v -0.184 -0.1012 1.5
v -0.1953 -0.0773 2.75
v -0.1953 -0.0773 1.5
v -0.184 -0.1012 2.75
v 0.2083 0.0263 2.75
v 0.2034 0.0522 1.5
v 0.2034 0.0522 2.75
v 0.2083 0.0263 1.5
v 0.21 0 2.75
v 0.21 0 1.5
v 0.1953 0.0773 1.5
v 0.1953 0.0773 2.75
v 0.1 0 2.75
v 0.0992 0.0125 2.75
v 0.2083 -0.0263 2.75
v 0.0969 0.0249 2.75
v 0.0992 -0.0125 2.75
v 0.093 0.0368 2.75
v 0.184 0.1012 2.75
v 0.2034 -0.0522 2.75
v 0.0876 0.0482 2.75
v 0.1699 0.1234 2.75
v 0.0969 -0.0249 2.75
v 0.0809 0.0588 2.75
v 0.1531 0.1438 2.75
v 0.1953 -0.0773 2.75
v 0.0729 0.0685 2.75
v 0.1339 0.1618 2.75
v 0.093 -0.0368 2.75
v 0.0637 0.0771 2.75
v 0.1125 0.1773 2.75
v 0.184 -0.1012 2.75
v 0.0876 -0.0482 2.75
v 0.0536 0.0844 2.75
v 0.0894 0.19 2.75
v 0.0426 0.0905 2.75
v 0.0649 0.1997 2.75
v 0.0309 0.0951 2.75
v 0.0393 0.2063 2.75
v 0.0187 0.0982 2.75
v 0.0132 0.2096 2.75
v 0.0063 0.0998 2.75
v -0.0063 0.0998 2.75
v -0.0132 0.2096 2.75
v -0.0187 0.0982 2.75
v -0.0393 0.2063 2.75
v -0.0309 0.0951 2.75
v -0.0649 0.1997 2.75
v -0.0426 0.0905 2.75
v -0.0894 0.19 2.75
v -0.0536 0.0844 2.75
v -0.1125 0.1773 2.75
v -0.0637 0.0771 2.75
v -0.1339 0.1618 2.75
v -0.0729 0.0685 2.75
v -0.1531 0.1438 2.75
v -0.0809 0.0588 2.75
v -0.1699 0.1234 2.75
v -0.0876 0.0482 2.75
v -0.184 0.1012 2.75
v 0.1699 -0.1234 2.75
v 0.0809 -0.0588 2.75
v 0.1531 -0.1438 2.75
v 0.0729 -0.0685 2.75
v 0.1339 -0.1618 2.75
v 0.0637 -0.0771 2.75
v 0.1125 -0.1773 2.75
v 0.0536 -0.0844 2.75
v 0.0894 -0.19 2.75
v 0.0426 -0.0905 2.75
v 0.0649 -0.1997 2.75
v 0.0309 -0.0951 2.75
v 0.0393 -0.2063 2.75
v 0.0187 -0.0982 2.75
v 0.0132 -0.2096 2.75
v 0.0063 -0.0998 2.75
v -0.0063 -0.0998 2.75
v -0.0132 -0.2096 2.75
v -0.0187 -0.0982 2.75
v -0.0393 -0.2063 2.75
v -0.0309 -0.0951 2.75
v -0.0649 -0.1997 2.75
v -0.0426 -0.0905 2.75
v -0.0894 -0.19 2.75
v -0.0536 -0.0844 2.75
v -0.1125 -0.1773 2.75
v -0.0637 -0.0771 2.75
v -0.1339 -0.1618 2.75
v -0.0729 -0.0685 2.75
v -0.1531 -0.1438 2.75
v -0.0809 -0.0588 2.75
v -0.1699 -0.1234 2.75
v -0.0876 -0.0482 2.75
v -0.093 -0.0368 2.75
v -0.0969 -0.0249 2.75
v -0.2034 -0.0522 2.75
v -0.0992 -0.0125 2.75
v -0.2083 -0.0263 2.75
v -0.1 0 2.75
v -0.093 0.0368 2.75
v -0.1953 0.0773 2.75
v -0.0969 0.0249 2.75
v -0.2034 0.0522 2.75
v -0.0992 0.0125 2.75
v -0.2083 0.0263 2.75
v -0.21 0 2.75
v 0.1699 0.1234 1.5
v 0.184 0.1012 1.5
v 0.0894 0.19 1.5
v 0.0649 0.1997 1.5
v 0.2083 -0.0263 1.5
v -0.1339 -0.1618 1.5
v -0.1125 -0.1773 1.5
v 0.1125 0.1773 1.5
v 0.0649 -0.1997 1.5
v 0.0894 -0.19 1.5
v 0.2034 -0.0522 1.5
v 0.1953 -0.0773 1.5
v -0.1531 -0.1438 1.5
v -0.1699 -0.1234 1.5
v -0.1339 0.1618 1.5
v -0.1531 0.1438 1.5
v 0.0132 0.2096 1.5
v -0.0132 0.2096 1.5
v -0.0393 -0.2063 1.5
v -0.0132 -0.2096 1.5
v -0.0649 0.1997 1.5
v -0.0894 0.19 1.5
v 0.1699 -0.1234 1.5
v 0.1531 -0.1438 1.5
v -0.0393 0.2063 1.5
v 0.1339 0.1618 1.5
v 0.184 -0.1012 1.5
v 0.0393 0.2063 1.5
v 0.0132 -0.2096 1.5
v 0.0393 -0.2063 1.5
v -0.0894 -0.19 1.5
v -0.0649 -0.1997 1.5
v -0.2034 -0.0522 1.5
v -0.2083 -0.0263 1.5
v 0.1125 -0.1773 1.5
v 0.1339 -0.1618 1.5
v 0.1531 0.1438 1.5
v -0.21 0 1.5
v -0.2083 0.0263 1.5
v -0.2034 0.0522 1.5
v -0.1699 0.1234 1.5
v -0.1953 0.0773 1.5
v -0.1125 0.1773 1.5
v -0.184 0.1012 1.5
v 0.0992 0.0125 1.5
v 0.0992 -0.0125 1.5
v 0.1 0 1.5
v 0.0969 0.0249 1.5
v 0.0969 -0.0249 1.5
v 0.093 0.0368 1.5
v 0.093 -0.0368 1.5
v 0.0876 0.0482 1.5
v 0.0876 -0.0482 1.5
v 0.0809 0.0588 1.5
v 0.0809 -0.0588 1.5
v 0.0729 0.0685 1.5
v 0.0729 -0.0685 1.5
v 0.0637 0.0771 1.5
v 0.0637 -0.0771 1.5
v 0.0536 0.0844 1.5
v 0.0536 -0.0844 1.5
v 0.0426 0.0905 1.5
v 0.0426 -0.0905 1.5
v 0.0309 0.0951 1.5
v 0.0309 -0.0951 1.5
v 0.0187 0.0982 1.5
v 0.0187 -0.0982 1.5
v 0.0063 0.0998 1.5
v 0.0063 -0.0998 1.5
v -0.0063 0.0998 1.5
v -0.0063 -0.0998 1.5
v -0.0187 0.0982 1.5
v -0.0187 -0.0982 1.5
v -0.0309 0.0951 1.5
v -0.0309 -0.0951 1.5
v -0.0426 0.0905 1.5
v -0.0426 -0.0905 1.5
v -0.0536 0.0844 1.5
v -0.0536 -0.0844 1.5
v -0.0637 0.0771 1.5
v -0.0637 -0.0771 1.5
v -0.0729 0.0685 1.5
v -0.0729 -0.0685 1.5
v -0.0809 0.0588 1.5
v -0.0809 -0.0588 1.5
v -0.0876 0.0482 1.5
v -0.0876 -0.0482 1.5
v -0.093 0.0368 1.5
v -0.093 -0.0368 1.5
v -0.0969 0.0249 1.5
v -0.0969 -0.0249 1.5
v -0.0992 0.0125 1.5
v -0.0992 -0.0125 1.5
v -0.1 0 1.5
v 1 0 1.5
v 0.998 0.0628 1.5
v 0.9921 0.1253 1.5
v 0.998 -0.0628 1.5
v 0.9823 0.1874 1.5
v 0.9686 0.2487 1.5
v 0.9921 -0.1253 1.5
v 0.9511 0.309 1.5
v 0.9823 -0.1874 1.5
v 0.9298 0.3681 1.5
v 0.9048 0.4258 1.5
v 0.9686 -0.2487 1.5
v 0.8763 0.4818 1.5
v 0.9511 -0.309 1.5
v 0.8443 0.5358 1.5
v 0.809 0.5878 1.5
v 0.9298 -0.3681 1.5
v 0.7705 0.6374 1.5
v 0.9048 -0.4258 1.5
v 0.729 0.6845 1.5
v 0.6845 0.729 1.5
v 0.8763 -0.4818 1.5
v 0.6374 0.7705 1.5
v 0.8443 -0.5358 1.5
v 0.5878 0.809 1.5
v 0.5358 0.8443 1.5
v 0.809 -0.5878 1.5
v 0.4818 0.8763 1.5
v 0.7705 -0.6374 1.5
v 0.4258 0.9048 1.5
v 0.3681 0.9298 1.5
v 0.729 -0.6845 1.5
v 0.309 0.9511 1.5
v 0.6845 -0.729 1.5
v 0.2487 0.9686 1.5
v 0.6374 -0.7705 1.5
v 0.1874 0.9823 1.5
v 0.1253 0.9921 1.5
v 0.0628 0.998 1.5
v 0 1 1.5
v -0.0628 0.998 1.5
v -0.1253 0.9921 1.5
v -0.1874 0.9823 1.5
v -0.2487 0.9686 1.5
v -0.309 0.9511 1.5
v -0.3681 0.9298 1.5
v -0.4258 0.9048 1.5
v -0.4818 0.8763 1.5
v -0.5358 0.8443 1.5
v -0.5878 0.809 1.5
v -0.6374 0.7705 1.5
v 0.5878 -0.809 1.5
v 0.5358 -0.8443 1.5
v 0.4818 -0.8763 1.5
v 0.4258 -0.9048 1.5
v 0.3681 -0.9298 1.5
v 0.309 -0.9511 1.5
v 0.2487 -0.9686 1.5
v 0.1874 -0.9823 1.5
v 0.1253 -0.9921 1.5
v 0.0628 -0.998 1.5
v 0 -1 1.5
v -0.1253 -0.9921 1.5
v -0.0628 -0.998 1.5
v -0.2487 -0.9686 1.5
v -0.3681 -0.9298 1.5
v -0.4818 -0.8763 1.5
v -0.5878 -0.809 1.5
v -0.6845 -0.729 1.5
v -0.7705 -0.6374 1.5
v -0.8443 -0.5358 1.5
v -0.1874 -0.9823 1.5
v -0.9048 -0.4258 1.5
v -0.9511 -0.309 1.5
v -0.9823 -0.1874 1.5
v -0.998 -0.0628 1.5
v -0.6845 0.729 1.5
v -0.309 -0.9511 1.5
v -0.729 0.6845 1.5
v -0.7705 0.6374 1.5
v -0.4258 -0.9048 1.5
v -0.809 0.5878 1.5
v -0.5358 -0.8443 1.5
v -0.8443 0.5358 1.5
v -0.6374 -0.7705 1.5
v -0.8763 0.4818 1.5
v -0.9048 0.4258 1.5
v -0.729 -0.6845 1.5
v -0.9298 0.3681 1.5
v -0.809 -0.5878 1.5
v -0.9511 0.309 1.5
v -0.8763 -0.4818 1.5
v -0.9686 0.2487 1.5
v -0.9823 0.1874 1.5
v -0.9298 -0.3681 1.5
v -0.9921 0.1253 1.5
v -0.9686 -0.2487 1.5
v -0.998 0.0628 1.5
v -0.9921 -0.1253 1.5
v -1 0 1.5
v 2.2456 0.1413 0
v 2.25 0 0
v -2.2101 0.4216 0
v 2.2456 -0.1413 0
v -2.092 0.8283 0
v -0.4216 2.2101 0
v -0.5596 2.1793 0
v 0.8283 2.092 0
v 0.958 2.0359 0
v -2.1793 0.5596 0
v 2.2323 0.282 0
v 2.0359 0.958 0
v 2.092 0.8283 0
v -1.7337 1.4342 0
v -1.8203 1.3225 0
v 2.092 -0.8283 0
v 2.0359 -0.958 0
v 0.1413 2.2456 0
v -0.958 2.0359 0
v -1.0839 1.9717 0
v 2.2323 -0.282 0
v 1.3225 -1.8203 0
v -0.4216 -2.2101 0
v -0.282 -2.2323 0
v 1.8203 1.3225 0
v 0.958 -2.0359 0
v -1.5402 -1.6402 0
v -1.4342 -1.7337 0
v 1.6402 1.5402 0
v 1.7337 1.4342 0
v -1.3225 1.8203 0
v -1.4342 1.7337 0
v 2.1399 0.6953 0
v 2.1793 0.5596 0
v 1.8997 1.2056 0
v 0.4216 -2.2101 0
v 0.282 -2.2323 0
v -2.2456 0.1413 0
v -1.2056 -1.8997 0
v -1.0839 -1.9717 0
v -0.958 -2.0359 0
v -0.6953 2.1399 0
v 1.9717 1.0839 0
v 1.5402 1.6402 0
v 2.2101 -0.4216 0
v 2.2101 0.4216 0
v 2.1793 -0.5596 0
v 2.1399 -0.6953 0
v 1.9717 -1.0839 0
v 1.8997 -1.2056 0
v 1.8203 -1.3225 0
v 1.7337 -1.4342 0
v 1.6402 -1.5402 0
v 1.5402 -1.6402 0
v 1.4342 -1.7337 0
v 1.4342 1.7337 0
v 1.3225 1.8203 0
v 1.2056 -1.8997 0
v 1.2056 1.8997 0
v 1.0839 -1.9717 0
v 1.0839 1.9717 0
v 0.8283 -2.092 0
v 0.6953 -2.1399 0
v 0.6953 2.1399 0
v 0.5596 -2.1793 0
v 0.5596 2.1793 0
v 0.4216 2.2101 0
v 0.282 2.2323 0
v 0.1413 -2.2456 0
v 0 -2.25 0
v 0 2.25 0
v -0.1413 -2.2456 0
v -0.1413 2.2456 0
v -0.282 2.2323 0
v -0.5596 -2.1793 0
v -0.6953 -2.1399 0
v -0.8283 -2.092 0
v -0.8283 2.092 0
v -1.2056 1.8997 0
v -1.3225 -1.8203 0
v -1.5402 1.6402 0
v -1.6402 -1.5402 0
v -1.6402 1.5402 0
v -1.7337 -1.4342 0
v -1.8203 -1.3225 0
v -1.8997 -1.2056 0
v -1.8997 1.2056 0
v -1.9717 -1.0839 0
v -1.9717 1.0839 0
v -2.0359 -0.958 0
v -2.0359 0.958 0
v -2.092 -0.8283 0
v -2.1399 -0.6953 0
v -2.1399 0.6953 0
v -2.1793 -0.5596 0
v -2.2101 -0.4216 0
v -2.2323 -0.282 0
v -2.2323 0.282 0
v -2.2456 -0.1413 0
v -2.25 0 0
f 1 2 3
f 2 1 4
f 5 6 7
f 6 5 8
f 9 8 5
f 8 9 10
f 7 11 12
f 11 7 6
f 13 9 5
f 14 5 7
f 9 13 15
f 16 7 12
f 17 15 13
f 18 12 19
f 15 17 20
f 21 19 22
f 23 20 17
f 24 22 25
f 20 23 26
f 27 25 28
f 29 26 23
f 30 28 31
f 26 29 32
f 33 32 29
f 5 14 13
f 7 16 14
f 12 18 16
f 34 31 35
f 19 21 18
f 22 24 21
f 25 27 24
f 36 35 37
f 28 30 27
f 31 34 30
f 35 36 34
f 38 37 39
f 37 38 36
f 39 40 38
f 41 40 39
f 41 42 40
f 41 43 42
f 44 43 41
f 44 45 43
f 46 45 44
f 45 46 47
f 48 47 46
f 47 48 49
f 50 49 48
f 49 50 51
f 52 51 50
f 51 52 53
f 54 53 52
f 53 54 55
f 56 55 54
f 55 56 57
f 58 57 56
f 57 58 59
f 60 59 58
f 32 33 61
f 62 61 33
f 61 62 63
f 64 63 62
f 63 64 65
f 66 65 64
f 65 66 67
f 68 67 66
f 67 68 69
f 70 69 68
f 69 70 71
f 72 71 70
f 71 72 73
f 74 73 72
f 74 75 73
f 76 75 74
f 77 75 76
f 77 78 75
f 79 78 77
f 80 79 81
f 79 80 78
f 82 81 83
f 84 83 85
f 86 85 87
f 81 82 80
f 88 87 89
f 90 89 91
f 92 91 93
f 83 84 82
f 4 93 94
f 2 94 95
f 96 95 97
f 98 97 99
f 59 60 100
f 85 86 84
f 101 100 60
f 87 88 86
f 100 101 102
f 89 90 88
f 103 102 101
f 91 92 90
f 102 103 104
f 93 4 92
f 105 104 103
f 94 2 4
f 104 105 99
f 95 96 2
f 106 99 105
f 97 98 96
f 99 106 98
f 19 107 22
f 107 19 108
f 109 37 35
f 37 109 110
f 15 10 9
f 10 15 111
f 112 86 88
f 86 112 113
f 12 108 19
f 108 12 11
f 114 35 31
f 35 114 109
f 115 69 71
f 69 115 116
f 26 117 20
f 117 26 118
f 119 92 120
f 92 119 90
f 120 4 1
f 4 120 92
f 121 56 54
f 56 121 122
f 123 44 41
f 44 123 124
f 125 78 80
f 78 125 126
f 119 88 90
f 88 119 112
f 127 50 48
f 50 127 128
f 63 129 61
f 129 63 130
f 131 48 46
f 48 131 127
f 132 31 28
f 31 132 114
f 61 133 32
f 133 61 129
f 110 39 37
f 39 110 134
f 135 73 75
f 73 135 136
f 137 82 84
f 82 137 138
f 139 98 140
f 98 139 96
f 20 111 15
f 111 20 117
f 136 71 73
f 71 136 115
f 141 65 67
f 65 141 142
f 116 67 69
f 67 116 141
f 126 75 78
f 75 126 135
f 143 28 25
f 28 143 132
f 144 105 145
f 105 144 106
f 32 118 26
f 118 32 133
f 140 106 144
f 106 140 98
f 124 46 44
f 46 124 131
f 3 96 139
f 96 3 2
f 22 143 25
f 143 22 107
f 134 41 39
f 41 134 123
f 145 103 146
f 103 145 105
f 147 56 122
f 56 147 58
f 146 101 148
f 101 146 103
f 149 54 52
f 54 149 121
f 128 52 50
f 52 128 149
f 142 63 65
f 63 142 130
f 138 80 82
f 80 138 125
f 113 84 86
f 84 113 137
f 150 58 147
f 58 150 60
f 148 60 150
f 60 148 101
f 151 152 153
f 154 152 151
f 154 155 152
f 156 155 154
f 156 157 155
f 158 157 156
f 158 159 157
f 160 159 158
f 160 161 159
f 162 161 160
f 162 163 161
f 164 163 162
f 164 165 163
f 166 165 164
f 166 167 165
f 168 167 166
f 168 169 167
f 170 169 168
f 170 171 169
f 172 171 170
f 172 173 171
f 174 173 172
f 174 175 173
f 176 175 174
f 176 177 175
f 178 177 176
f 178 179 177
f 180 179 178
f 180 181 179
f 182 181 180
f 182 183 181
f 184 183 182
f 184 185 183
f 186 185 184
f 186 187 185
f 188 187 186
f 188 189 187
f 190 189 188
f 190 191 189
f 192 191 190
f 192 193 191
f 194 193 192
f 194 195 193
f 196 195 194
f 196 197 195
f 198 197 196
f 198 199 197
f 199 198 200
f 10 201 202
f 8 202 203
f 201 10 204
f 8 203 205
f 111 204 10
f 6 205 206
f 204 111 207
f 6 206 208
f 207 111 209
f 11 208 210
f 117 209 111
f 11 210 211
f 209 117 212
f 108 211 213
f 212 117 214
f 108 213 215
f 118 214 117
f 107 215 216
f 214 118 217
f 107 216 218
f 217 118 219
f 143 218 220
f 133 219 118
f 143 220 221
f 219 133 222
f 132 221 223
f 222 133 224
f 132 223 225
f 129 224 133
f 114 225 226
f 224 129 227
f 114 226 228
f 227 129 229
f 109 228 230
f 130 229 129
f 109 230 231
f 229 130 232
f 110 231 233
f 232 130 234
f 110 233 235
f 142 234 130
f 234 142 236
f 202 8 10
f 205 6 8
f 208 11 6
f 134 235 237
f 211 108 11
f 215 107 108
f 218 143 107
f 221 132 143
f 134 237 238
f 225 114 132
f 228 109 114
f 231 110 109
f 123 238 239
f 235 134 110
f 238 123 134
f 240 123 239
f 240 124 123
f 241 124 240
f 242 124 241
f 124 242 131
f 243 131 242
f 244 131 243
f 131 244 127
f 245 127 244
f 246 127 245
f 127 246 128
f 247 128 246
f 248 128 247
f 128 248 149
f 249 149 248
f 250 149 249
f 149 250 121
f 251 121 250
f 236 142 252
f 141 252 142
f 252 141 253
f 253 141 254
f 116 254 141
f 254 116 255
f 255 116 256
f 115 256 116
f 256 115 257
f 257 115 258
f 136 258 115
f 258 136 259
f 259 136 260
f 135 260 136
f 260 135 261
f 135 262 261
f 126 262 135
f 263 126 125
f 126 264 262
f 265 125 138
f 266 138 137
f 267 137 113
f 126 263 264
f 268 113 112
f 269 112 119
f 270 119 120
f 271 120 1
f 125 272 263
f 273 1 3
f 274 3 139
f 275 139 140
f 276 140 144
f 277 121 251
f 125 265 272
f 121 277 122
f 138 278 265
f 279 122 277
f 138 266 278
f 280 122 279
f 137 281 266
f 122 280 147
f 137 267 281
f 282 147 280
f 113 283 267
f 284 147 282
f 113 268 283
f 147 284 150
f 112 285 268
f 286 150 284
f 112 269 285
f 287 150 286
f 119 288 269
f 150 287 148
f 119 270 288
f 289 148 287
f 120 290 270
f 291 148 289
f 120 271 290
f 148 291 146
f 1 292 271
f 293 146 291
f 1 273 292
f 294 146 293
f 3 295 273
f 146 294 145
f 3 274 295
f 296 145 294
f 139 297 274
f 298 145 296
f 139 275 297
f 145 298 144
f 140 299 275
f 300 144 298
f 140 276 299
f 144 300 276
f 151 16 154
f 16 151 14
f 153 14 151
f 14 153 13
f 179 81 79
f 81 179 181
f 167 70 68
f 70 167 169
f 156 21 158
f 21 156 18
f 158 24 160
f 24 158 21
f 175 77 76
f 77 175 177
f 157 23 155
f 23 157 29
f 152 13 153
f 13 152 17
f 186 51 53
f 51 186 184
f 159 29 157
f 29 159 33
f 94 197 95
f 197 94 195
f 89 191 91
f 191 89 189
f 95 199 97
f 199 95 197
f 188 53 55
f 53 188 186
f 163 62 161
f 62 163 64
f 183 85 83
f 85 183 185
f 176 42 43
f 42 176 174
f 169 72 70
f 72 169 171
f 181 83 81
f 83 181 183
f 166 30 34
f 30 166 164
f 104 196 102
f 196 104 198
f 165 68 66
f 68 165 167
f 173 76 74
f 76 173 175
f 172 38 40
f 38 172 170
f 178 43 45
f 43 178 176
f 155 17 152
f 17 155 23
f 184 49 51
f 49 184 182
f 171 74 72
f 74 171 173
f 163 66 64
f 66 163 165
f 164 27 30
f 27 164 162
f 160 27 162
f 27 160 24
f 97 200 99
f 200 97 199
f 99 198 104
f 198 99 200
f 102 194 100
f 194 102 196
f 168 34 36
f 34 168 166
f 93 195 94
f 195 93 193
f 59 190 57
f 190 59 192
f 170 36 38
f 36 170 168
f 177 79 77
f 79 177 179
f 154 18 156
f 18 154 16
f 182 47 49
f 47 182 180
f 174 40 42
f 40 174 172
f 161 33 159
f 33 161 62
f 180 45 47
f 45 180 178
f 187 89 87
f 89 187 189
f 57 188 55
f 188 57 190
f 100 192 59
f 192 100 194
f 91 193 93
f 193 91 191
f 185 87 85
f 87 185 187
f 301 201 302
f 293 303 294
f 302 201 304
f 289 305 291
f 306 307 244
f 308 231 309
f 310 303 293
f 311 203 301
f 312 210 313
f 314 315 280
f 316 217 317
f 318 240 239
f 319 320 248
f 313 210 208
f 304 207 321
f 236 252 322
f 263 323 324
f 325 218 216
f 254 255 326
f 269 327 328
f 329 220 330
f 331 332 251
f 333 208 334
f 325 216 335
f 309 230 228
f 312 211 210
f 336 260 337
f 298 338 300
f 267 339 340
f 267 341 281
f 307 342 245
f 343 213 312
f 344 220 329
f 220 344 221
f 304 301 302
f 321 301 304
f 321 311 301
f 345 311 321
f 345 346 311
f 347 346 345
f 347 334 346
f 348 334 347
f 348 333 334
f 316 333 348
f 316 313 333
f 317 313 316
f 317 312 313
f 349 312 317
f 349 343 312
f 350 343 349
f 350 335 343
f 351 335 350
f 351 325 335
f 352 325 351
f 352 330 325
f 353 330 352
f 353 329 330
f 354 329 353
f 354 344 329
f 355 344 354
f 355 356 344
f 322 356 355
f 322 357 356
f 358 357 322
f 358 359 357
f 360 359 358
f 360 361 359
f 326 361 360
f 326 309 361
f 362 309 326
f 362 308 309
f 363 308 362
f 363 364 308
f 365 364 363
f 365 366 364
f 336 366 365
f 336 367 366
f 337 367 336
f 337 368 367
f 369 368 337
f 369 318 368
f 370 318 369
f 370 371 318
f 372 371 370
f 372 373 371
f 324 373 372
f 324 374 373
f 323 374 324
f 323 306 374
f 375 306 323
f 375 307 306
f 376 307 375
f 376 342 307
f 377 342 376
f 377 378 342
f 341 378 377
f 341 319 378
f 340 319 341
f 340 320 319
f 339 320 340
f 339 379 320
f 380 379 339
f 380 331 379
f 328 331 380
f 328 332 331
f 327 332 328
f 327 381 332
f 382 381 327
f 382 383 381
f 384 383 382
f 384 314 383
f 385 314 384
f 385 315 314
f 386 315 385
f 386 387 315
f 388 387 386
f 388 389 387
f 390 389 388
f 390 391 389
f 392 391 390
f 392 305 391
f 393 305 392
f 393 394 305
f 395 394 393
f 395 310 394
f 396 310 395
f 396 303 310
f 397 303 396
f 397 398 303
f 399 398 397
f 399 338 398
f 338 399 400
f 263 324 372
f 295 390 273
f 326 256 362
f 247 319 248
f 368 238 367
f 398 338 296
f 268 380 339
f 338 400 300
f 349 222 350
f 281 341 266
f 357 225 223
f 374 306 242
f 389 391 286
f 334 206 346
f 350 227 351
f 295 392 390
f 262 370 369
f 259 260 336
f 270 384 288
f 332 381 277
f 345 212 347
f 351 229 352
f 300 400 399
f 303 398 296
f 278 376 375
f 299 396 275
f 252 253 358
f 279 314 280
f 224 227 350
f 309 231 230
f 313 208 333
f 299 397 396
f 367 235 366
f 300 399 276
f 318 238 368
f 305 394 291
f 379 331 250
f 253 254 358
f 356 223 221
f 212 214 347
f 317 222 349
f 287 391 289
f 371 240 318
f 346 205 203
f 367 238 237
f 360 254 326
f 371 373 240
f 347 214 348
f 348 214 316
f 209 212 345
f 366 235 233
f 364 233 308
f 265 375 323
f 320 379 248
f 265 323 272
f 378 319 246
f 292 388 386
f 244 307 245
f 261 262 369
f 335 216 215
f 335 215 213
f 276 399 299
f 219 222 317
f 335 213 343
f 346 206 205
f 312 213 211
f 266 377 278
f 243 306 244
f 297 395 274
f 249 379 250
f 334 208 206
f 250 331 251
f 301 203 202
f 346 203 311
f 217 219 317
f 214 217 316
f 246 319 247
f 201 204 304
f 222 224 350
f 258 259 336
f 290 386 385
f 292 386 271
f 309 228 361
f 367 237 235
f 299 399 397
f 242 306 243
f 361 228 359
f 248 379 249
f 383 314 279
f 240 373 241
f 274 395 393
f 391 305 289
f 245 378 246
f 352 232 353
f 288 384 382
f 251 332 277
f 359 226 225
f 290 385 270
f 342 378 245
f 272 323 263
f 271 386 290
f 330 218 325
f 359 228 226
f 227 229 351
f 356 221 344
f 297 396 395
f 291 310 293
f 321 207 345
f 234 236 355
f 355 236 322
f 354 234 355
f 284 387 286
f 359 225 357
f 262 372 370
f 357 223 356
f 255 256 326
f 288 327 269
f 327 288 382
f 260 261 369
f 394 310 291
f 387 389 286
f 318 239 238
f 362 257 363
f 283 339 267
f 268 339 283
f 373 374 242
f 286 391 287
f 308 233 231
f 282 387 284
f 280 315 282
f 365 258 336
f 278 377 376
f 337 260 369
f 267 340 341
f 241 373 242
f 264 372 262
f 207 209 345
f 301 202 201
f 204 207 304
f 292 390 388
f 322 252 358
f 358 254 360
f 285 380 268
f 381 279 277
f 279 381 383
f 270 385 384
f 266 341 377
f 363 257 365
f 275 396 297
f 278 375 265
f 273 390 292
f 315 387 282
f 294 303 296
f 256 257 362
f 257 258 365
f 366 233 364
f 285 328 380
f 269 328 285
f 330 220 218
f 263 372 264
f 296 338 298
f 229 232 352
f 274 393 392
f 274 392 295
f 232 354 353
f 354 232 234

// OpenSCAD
// Width of the tree base
numerical_slider = .05; // [.1:.85]
cylinder(h=1.5,r1=2.25,r2=1,$fn=100);
translate ([0,0,1.5]) {
    difference () {
        cylinder(h=1.25,r1=numerical_slider+.16,r2=numerical_slider+.16,$fn=50);
        cylinder(h=1.25,r1=numerical_slider+.05,r2=numerical_slider+.05,$fn=50);
    }
}
